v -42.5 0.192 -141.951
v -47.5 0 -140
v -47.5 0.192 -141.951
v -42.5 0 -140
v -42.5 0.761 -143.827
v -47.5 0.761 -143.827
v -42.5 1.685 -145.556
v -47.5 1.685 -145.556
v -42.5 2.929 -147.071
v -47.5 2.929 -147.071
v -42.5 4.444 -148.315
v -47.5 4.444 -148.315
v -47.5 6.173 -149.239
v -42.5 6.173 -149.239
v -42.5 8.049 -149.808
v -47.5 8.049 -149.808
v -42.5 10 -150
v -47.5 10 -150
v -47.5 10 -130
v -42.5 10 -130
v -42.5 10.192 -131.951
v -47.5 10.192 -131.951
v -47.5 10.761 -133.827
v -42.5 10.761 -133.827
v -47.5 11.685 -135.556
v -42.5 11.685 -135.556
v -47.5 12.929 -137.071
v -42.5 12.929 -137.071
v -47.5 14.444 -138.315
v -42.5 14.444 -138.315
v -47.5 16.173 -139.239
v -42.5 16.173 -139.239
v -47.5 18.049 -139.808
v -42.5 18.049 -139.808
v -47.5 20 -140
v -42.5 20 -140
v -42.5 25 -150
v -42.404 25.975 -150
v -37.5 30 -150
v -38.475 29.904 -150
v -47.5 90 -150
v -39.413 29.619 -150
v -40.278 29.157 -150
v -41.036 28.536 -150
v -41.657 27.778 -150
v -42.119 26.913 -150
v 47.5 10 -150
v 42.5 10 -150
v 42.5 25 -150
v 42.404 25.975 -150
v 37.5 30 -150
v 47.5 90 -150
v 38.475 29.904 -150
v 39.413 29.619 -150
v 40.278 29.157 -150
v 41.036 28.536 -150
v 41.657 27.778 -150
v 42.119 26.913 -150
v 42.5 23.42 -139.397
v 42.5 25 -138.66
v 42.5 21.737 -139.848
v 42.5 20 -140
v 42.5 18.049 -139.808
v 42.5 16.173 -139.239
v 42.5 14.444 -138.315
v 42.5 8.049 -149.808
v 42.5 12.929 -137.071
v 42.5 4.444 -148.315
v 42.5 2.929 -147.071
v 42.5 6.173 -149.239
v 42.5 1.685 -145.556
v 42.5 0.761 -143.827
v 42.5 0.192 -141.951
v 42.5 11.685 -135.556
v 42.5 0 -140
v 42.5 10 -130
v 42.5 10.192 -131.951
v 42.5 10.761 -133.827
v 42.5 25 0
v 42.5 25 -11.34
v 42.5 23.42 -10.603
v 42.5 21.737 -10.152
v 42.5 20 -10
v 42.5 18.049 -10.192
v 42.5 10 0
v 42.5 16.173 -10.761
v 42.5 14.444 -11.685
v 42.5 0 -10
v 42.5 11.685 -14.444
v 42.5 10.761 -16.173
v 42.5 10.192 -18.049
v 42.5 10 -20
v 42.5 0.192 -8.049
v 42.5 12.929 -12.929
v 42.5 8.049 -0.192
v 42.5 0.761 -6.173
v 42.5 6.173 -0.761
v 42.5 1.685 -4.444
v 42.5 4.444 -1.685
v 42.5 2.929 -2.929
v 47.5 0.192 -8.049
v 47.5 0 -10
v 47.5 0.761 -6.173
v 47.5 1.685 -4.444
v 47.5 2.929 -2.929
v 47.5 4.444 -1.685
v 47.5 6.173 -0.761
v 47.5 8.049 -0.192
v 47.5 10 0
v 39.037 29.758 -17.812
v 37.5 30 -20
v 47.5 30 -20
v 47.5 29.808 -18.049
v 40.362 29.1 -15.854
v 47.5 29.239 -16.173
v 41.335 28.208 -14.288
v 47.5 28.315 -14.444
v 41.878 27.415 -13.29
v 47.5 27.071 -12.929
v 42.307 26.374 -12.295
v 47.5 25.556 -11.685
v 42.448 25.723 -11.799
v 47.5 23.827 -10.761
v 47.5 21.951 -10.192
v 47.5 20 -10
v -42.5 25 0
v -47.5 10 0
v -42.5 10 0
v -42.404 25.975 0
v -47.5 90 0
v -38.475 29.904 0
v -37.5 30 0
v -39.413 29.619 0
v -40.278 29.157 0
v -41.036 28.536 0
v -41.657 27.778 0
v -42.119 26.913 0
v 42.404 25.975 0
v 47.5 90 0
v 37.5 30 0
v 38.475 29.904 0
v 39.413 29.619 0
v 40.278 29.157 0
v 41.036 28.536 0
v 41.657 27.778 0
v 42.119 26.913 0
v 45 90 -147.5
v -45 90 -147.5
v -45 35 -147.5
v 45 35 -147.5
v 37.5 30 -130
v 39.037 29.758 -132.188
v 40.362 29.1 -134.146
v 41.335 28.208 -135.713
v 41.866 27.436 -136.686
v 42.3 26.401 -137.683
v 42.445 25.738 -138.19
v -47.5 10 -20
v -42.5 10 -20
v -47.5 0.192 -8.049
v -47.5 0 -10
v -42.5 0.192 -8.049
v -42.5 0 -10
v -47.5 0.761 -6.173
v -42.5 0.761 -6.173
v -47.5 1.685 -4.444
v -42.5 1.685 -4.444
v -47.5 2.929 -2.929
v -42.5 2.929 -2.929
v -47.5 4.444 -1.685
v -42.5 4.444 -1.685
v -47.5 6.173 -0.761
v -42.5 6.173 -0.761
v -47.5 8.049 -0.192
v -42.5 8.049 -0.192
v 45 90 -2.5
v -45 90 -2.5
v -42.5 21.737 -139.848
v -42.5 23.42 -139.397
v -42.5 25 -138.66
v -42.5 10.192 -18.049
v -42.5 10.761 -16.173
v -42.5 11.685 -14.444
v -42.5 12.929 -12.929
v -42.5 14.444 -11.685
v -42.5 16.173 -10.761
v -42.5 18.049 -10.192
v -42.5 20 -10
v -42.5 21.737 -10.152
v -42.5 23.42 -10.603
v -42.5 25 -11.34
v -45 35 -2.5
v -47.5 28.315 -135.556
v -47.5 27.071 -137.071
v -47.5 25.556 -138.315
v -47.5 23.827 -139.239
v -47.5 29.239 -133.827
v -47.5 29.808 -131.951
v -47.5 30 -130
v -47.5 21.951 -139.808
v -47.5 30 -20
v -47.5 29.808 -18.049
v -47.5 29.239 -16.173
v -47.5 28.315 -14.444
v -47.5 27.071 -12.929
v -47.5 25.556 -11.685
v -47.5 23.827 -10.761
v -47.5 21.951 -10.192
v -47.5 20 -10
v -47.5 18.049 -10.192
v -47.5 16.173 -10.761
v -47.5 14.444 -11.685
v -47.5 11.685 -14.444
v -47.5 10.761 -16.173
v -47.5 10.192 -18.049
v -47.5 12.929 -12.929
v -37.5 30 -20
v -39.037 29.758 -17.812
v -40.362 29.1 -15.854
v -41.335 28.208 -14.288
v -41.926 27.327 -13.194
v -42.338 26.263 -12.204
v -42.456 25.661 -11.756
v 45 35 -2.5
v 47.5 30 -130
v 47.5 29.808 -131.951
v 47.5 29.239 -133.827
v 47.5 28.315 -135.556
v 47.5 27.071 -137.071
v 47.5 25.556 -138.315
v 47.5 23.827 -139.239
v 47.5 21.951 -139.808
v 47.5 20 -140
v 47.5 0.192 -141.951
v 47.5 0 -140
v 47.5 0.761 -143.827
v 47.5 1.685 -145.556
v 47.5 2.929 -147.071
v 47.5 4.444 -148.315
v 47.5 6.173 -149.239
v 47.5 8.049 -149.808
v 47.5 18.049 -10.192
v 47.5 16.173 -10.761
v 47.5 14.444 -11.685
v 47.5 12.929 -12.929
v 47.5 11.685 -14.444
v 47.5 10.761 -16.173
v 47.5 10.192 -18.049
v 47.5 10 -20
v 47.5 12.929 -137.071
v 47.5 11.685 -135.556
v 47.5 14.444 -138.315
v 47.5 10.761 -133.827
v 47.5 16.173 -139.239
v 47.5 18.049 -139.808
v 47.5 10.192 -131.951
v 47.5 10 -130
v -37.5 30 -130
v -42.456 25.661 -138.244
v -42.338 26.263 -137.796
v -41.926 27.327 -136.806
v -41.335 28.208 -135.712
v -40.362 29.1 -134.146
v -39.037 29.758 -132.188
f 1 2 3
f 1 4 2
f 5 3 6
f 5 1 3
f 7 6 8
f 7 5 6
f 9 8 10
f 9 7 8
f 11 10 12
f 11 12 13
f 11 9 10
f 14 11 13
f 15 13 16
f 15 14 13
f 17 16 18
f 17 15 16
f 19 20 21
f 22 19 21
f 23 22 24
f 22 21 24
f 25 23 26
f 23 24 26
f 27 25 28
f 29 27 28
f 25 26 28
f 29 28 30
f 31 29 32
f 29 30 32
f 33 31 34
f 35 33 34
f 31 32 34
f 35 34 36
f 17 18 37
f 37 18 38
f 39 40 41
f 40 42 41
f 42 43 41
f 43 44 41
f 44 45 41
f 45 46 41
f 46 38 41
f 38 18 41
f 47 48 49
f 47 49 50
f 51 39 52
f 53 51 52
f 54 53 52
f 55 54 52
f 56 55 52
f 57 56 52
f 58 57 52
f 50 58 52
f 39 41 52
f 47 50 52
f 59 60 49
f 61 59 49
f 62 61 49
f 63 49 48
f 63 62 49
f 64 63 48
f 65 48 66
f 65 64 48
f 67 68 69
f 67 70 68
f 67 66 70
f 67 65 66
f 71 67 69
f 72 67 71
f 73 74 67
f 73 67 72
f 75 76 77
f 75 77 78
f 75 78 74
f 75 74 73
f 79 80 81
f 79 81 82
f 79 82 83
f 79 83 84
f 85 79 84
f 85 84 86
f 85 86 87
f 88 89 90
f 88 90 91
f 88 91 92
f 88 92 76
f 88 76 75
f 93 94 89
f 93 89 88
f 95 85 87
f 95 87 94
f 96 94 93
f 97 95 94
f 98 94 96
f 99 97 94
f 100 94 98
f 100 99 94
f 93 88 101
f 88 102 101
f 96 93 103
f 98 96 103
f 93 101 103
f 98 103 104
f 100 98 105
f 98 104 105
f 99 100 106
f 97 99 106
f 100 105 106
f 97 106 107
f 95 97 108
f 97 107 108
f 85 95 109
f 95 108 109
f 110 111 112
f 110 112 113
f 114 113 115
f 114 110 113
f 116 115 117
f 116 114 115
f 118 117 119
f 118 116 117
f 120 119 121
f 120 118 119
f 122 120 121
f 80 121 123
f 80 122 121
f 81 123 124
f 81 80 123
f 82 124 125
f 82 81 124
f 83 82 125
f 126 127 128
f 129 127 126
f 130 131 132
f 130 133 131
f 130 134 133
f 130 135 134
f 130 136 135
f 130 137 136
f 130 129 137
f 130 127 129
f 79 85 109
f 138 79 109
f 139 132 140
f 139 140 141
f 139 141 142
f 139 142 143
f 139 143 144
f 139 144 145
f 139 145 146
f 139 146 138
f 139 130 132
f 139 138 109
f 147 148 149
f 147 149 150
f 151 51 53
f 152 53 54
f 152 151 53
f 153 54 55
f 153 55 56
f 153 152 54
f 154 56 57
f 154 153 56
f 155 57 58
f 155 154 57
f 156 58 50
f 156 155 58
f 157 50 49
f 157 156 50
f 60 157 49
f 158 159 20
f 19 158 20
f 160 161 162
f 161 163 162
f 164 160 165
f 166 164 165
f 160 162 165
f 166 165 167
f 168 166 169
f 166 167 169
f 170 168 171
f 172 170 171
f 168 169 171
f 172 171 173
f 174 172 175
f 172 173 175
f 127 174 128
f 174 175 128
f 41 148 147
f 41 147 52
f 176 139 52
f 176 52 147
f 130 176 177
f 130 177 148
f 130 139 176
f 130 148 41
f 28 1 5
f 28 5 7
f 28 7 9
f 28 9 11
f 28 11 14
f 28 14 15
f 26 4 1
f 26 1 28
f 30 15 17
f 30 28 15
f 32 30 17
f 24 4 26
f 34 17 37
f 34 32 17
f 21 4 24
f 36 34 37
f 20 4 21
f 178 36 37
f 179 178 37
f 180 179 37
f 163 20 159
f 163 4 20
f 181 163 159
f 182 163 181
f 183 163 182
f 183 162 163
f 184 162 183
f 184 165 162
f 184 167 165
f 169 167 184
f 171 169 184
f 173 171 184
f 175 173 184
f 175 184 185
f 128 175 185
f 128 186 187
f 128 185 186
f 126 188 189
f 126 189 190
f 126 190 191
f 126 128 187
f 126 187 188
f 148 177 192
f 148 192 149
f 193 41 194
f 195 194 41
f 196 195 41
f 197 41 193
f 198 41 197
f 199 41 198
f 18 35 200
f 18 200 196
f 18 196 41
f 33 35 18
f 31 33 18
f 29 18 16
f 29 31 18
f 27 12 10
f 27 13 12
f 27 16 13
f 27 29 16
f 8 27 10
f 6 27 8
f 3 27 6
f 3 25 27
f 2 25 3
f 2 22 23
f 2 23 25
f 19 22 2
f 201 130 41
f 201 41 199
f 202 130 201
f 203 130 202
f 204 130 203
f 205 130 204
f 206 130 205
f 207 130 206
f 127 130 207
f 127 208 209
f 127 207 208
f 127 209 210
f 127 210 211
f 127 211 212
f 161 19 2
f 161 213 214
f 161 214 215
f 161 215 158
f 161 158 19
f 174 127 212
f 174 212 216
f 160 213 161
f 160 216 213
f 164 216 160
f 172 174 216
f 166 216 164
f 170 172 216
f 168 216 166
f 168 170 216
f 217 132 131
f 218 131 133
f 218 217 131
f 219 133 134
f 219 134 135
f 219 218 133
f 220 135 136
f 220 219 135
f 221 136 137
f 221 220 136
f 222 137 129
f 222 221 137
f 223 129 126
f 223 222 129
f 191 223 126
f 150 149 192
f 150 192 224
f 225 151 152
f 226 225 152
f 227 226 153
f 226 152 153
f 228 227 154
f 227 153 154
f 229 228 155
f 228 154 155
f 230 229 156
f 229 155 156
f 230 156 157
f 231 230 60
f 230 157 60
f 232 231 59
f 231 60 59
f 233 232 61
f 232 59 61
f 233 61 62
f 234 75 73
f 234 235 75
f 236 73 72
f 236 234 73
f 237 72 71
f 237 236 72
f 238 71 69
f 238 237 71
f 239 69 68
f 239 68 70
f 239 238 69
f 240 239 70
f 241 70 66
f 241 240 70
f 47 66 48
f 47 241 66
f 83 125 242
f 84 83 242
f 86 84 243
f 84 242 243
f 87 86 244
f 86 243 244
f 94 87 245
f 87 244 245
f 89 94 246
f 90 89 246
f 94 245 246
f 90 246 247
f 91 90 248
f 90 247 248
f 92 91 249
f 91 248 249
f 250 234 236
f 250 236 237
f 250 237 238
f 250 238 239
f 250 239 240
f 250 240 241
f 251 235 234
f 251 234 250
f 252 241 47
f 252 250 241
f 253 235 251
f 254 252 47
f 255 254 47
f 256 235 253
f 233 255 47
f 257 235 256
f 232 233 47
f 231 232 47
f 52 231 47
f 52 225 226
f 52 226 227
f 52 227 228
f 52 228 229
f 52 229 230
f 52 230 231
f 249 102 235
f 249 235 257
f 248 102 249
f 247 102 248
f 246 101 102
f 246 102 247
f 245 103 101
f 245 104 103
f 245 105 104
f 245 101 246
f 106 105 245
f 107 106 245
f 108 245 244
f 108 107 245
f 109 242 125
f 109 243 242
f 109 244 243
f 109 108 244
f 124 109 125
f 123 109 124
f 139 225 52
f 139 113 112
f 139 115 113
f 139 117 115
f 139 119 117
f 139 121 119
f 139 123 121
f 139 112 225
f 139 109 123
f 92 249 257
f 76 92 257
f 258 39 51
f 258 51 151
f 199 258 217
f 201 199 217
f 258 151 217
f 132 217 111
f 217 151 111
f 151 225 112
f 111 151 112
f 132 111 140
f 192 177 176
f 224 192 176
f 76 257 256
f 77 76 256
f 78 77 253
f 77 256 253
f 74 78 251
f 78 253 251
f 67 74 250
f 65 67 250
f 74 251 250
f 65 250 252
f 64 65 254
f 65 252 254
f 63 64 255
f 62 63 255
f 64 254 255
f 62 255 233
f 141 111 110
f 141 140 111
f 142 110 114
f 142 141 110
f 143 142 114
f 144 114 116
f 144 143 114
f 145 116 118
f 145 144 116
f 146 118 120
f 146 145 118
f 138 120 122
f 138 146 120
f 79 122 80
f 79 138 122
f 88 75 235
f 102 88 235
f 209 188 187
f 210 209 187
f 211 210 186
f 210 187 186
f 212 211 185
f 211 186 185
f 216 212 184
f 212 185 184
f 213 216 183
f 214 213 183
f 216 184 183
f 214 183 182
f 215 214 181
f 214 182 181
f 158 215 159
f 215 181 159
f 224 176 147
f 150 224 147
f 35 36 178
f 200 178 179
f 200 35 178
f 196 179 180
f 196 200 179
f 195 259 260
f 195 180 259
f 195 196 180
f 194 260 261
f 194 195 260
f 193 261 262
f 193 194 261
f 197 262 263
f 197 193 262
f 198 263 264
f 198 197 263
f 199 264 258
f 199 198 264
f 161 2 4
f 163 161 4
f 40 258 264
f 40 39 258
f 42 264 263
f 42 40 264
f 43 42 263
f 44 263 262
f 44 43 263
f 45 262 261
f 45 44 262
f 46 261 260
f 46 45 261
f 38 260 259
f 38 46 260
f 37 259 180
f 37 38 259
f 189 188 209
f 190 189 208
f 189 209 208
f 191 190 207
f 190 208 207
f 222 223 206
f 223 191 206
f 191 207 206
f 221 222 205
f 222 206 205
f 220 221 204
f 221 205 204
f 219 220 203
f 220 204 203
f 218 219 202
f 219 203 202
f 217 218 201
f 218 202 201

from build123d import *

# Parameters (mm, degrees)
BOSS_EXTRUDE1_DEPTH = 150
FILLET1_R           = 10
CUT_EXTRUDE1_DEPTH  = 200.060292374
FILLET2_R           = 10
SKETCH3_W           = 90
SKETCH3_H           = 145
CUT_EXTRUDE2_DEPTH  = 55
FILLET3_R           = 5


with BuildPart() as part:
    # Sketch1 → Boss-Extrude1 (new body)
    with BuildSketch(Plane.XY):
        Polygon((-47.5, 90), (-47.5, 0), (-42.5, 0), (-42.5, 30), (42.5, 30), (42.5, 0), (47.5, 0), (47.5, 90), align=None)
    extrude(amount=-BOSS_EXTRUDE1_DEPTH)

    # Fillet1
    fillet1_edges = [part.edges().sort_by_distance(p)[0] for p in [
        (-45, 0, 0),
        (45, 0, -150),
        (45, 0, 0),
        (-45, 0, -150),
    ]]
    fillet(fillet1_edges, radius=FILLET1_R)

    # Sketch2 → Cut-Extrude1 (cut, through all)
    with BuildSketch(Plane(origin=(47.5, 0, 0), x_dir=(0, 0, -1), z_dir=(1, 0, 0))):
        with BuildLine():
            Line((140, 20), (140, 30))
            Line((140, 30), (10, 30))
            Line((10, 30), (10, 20))
            ThreePointArc((10, 20), (12.928932188, 12.928932188), (20, 10))
            Line((20, 10), (130, 10))
            ThreePointArc((130, 10), (137.071067812, 12.928932188), (140, 20))
        make_face()
    extrude(amount=-CUT_EXTRUDE1_DEPTH, mode=Mode.SUBTRACT)

    # Fillet2
    fillet2_edges = [part.edges().sort_by_distance(p)[0] for p in [
        (-45, 30, -140),
        (-45, 30, -10),
        (45, 30, -140),
        (45, 30, -10),
    ]]
    fillet(fillet2_edges, radius=FILLET2_R - 0.0001)  # a hair under: the kernel refuses the full size

    # Sketch3 → Cut-Extrude2 (cut)
    with BuildSketch(Plane(origin=(0, 90, 0), x_dir=(1, 0, 0), z_dir=(0, 1, 0))):
        with Locations((0, 75)):
            Rectangle(SKETCH3_W, SKETCH3_H)
    extrude(amount=-CUT_EXTRUDE2_DEPTH, mode=Mode.SUBTRACT)

    # Fillet3
    fillet3_edges = [part.edges().sort_by_distance(p)[0] for p in [
        (42.5, 30, -140.00005),
        (-42.5, 30, -140.00005),
        (-42.5, 30, -9.99995),
        (42.5, 30, -9.99995),
    ]]
    fillet(fillet3_edges, radius=FILLET3_R)


solid = part.part
